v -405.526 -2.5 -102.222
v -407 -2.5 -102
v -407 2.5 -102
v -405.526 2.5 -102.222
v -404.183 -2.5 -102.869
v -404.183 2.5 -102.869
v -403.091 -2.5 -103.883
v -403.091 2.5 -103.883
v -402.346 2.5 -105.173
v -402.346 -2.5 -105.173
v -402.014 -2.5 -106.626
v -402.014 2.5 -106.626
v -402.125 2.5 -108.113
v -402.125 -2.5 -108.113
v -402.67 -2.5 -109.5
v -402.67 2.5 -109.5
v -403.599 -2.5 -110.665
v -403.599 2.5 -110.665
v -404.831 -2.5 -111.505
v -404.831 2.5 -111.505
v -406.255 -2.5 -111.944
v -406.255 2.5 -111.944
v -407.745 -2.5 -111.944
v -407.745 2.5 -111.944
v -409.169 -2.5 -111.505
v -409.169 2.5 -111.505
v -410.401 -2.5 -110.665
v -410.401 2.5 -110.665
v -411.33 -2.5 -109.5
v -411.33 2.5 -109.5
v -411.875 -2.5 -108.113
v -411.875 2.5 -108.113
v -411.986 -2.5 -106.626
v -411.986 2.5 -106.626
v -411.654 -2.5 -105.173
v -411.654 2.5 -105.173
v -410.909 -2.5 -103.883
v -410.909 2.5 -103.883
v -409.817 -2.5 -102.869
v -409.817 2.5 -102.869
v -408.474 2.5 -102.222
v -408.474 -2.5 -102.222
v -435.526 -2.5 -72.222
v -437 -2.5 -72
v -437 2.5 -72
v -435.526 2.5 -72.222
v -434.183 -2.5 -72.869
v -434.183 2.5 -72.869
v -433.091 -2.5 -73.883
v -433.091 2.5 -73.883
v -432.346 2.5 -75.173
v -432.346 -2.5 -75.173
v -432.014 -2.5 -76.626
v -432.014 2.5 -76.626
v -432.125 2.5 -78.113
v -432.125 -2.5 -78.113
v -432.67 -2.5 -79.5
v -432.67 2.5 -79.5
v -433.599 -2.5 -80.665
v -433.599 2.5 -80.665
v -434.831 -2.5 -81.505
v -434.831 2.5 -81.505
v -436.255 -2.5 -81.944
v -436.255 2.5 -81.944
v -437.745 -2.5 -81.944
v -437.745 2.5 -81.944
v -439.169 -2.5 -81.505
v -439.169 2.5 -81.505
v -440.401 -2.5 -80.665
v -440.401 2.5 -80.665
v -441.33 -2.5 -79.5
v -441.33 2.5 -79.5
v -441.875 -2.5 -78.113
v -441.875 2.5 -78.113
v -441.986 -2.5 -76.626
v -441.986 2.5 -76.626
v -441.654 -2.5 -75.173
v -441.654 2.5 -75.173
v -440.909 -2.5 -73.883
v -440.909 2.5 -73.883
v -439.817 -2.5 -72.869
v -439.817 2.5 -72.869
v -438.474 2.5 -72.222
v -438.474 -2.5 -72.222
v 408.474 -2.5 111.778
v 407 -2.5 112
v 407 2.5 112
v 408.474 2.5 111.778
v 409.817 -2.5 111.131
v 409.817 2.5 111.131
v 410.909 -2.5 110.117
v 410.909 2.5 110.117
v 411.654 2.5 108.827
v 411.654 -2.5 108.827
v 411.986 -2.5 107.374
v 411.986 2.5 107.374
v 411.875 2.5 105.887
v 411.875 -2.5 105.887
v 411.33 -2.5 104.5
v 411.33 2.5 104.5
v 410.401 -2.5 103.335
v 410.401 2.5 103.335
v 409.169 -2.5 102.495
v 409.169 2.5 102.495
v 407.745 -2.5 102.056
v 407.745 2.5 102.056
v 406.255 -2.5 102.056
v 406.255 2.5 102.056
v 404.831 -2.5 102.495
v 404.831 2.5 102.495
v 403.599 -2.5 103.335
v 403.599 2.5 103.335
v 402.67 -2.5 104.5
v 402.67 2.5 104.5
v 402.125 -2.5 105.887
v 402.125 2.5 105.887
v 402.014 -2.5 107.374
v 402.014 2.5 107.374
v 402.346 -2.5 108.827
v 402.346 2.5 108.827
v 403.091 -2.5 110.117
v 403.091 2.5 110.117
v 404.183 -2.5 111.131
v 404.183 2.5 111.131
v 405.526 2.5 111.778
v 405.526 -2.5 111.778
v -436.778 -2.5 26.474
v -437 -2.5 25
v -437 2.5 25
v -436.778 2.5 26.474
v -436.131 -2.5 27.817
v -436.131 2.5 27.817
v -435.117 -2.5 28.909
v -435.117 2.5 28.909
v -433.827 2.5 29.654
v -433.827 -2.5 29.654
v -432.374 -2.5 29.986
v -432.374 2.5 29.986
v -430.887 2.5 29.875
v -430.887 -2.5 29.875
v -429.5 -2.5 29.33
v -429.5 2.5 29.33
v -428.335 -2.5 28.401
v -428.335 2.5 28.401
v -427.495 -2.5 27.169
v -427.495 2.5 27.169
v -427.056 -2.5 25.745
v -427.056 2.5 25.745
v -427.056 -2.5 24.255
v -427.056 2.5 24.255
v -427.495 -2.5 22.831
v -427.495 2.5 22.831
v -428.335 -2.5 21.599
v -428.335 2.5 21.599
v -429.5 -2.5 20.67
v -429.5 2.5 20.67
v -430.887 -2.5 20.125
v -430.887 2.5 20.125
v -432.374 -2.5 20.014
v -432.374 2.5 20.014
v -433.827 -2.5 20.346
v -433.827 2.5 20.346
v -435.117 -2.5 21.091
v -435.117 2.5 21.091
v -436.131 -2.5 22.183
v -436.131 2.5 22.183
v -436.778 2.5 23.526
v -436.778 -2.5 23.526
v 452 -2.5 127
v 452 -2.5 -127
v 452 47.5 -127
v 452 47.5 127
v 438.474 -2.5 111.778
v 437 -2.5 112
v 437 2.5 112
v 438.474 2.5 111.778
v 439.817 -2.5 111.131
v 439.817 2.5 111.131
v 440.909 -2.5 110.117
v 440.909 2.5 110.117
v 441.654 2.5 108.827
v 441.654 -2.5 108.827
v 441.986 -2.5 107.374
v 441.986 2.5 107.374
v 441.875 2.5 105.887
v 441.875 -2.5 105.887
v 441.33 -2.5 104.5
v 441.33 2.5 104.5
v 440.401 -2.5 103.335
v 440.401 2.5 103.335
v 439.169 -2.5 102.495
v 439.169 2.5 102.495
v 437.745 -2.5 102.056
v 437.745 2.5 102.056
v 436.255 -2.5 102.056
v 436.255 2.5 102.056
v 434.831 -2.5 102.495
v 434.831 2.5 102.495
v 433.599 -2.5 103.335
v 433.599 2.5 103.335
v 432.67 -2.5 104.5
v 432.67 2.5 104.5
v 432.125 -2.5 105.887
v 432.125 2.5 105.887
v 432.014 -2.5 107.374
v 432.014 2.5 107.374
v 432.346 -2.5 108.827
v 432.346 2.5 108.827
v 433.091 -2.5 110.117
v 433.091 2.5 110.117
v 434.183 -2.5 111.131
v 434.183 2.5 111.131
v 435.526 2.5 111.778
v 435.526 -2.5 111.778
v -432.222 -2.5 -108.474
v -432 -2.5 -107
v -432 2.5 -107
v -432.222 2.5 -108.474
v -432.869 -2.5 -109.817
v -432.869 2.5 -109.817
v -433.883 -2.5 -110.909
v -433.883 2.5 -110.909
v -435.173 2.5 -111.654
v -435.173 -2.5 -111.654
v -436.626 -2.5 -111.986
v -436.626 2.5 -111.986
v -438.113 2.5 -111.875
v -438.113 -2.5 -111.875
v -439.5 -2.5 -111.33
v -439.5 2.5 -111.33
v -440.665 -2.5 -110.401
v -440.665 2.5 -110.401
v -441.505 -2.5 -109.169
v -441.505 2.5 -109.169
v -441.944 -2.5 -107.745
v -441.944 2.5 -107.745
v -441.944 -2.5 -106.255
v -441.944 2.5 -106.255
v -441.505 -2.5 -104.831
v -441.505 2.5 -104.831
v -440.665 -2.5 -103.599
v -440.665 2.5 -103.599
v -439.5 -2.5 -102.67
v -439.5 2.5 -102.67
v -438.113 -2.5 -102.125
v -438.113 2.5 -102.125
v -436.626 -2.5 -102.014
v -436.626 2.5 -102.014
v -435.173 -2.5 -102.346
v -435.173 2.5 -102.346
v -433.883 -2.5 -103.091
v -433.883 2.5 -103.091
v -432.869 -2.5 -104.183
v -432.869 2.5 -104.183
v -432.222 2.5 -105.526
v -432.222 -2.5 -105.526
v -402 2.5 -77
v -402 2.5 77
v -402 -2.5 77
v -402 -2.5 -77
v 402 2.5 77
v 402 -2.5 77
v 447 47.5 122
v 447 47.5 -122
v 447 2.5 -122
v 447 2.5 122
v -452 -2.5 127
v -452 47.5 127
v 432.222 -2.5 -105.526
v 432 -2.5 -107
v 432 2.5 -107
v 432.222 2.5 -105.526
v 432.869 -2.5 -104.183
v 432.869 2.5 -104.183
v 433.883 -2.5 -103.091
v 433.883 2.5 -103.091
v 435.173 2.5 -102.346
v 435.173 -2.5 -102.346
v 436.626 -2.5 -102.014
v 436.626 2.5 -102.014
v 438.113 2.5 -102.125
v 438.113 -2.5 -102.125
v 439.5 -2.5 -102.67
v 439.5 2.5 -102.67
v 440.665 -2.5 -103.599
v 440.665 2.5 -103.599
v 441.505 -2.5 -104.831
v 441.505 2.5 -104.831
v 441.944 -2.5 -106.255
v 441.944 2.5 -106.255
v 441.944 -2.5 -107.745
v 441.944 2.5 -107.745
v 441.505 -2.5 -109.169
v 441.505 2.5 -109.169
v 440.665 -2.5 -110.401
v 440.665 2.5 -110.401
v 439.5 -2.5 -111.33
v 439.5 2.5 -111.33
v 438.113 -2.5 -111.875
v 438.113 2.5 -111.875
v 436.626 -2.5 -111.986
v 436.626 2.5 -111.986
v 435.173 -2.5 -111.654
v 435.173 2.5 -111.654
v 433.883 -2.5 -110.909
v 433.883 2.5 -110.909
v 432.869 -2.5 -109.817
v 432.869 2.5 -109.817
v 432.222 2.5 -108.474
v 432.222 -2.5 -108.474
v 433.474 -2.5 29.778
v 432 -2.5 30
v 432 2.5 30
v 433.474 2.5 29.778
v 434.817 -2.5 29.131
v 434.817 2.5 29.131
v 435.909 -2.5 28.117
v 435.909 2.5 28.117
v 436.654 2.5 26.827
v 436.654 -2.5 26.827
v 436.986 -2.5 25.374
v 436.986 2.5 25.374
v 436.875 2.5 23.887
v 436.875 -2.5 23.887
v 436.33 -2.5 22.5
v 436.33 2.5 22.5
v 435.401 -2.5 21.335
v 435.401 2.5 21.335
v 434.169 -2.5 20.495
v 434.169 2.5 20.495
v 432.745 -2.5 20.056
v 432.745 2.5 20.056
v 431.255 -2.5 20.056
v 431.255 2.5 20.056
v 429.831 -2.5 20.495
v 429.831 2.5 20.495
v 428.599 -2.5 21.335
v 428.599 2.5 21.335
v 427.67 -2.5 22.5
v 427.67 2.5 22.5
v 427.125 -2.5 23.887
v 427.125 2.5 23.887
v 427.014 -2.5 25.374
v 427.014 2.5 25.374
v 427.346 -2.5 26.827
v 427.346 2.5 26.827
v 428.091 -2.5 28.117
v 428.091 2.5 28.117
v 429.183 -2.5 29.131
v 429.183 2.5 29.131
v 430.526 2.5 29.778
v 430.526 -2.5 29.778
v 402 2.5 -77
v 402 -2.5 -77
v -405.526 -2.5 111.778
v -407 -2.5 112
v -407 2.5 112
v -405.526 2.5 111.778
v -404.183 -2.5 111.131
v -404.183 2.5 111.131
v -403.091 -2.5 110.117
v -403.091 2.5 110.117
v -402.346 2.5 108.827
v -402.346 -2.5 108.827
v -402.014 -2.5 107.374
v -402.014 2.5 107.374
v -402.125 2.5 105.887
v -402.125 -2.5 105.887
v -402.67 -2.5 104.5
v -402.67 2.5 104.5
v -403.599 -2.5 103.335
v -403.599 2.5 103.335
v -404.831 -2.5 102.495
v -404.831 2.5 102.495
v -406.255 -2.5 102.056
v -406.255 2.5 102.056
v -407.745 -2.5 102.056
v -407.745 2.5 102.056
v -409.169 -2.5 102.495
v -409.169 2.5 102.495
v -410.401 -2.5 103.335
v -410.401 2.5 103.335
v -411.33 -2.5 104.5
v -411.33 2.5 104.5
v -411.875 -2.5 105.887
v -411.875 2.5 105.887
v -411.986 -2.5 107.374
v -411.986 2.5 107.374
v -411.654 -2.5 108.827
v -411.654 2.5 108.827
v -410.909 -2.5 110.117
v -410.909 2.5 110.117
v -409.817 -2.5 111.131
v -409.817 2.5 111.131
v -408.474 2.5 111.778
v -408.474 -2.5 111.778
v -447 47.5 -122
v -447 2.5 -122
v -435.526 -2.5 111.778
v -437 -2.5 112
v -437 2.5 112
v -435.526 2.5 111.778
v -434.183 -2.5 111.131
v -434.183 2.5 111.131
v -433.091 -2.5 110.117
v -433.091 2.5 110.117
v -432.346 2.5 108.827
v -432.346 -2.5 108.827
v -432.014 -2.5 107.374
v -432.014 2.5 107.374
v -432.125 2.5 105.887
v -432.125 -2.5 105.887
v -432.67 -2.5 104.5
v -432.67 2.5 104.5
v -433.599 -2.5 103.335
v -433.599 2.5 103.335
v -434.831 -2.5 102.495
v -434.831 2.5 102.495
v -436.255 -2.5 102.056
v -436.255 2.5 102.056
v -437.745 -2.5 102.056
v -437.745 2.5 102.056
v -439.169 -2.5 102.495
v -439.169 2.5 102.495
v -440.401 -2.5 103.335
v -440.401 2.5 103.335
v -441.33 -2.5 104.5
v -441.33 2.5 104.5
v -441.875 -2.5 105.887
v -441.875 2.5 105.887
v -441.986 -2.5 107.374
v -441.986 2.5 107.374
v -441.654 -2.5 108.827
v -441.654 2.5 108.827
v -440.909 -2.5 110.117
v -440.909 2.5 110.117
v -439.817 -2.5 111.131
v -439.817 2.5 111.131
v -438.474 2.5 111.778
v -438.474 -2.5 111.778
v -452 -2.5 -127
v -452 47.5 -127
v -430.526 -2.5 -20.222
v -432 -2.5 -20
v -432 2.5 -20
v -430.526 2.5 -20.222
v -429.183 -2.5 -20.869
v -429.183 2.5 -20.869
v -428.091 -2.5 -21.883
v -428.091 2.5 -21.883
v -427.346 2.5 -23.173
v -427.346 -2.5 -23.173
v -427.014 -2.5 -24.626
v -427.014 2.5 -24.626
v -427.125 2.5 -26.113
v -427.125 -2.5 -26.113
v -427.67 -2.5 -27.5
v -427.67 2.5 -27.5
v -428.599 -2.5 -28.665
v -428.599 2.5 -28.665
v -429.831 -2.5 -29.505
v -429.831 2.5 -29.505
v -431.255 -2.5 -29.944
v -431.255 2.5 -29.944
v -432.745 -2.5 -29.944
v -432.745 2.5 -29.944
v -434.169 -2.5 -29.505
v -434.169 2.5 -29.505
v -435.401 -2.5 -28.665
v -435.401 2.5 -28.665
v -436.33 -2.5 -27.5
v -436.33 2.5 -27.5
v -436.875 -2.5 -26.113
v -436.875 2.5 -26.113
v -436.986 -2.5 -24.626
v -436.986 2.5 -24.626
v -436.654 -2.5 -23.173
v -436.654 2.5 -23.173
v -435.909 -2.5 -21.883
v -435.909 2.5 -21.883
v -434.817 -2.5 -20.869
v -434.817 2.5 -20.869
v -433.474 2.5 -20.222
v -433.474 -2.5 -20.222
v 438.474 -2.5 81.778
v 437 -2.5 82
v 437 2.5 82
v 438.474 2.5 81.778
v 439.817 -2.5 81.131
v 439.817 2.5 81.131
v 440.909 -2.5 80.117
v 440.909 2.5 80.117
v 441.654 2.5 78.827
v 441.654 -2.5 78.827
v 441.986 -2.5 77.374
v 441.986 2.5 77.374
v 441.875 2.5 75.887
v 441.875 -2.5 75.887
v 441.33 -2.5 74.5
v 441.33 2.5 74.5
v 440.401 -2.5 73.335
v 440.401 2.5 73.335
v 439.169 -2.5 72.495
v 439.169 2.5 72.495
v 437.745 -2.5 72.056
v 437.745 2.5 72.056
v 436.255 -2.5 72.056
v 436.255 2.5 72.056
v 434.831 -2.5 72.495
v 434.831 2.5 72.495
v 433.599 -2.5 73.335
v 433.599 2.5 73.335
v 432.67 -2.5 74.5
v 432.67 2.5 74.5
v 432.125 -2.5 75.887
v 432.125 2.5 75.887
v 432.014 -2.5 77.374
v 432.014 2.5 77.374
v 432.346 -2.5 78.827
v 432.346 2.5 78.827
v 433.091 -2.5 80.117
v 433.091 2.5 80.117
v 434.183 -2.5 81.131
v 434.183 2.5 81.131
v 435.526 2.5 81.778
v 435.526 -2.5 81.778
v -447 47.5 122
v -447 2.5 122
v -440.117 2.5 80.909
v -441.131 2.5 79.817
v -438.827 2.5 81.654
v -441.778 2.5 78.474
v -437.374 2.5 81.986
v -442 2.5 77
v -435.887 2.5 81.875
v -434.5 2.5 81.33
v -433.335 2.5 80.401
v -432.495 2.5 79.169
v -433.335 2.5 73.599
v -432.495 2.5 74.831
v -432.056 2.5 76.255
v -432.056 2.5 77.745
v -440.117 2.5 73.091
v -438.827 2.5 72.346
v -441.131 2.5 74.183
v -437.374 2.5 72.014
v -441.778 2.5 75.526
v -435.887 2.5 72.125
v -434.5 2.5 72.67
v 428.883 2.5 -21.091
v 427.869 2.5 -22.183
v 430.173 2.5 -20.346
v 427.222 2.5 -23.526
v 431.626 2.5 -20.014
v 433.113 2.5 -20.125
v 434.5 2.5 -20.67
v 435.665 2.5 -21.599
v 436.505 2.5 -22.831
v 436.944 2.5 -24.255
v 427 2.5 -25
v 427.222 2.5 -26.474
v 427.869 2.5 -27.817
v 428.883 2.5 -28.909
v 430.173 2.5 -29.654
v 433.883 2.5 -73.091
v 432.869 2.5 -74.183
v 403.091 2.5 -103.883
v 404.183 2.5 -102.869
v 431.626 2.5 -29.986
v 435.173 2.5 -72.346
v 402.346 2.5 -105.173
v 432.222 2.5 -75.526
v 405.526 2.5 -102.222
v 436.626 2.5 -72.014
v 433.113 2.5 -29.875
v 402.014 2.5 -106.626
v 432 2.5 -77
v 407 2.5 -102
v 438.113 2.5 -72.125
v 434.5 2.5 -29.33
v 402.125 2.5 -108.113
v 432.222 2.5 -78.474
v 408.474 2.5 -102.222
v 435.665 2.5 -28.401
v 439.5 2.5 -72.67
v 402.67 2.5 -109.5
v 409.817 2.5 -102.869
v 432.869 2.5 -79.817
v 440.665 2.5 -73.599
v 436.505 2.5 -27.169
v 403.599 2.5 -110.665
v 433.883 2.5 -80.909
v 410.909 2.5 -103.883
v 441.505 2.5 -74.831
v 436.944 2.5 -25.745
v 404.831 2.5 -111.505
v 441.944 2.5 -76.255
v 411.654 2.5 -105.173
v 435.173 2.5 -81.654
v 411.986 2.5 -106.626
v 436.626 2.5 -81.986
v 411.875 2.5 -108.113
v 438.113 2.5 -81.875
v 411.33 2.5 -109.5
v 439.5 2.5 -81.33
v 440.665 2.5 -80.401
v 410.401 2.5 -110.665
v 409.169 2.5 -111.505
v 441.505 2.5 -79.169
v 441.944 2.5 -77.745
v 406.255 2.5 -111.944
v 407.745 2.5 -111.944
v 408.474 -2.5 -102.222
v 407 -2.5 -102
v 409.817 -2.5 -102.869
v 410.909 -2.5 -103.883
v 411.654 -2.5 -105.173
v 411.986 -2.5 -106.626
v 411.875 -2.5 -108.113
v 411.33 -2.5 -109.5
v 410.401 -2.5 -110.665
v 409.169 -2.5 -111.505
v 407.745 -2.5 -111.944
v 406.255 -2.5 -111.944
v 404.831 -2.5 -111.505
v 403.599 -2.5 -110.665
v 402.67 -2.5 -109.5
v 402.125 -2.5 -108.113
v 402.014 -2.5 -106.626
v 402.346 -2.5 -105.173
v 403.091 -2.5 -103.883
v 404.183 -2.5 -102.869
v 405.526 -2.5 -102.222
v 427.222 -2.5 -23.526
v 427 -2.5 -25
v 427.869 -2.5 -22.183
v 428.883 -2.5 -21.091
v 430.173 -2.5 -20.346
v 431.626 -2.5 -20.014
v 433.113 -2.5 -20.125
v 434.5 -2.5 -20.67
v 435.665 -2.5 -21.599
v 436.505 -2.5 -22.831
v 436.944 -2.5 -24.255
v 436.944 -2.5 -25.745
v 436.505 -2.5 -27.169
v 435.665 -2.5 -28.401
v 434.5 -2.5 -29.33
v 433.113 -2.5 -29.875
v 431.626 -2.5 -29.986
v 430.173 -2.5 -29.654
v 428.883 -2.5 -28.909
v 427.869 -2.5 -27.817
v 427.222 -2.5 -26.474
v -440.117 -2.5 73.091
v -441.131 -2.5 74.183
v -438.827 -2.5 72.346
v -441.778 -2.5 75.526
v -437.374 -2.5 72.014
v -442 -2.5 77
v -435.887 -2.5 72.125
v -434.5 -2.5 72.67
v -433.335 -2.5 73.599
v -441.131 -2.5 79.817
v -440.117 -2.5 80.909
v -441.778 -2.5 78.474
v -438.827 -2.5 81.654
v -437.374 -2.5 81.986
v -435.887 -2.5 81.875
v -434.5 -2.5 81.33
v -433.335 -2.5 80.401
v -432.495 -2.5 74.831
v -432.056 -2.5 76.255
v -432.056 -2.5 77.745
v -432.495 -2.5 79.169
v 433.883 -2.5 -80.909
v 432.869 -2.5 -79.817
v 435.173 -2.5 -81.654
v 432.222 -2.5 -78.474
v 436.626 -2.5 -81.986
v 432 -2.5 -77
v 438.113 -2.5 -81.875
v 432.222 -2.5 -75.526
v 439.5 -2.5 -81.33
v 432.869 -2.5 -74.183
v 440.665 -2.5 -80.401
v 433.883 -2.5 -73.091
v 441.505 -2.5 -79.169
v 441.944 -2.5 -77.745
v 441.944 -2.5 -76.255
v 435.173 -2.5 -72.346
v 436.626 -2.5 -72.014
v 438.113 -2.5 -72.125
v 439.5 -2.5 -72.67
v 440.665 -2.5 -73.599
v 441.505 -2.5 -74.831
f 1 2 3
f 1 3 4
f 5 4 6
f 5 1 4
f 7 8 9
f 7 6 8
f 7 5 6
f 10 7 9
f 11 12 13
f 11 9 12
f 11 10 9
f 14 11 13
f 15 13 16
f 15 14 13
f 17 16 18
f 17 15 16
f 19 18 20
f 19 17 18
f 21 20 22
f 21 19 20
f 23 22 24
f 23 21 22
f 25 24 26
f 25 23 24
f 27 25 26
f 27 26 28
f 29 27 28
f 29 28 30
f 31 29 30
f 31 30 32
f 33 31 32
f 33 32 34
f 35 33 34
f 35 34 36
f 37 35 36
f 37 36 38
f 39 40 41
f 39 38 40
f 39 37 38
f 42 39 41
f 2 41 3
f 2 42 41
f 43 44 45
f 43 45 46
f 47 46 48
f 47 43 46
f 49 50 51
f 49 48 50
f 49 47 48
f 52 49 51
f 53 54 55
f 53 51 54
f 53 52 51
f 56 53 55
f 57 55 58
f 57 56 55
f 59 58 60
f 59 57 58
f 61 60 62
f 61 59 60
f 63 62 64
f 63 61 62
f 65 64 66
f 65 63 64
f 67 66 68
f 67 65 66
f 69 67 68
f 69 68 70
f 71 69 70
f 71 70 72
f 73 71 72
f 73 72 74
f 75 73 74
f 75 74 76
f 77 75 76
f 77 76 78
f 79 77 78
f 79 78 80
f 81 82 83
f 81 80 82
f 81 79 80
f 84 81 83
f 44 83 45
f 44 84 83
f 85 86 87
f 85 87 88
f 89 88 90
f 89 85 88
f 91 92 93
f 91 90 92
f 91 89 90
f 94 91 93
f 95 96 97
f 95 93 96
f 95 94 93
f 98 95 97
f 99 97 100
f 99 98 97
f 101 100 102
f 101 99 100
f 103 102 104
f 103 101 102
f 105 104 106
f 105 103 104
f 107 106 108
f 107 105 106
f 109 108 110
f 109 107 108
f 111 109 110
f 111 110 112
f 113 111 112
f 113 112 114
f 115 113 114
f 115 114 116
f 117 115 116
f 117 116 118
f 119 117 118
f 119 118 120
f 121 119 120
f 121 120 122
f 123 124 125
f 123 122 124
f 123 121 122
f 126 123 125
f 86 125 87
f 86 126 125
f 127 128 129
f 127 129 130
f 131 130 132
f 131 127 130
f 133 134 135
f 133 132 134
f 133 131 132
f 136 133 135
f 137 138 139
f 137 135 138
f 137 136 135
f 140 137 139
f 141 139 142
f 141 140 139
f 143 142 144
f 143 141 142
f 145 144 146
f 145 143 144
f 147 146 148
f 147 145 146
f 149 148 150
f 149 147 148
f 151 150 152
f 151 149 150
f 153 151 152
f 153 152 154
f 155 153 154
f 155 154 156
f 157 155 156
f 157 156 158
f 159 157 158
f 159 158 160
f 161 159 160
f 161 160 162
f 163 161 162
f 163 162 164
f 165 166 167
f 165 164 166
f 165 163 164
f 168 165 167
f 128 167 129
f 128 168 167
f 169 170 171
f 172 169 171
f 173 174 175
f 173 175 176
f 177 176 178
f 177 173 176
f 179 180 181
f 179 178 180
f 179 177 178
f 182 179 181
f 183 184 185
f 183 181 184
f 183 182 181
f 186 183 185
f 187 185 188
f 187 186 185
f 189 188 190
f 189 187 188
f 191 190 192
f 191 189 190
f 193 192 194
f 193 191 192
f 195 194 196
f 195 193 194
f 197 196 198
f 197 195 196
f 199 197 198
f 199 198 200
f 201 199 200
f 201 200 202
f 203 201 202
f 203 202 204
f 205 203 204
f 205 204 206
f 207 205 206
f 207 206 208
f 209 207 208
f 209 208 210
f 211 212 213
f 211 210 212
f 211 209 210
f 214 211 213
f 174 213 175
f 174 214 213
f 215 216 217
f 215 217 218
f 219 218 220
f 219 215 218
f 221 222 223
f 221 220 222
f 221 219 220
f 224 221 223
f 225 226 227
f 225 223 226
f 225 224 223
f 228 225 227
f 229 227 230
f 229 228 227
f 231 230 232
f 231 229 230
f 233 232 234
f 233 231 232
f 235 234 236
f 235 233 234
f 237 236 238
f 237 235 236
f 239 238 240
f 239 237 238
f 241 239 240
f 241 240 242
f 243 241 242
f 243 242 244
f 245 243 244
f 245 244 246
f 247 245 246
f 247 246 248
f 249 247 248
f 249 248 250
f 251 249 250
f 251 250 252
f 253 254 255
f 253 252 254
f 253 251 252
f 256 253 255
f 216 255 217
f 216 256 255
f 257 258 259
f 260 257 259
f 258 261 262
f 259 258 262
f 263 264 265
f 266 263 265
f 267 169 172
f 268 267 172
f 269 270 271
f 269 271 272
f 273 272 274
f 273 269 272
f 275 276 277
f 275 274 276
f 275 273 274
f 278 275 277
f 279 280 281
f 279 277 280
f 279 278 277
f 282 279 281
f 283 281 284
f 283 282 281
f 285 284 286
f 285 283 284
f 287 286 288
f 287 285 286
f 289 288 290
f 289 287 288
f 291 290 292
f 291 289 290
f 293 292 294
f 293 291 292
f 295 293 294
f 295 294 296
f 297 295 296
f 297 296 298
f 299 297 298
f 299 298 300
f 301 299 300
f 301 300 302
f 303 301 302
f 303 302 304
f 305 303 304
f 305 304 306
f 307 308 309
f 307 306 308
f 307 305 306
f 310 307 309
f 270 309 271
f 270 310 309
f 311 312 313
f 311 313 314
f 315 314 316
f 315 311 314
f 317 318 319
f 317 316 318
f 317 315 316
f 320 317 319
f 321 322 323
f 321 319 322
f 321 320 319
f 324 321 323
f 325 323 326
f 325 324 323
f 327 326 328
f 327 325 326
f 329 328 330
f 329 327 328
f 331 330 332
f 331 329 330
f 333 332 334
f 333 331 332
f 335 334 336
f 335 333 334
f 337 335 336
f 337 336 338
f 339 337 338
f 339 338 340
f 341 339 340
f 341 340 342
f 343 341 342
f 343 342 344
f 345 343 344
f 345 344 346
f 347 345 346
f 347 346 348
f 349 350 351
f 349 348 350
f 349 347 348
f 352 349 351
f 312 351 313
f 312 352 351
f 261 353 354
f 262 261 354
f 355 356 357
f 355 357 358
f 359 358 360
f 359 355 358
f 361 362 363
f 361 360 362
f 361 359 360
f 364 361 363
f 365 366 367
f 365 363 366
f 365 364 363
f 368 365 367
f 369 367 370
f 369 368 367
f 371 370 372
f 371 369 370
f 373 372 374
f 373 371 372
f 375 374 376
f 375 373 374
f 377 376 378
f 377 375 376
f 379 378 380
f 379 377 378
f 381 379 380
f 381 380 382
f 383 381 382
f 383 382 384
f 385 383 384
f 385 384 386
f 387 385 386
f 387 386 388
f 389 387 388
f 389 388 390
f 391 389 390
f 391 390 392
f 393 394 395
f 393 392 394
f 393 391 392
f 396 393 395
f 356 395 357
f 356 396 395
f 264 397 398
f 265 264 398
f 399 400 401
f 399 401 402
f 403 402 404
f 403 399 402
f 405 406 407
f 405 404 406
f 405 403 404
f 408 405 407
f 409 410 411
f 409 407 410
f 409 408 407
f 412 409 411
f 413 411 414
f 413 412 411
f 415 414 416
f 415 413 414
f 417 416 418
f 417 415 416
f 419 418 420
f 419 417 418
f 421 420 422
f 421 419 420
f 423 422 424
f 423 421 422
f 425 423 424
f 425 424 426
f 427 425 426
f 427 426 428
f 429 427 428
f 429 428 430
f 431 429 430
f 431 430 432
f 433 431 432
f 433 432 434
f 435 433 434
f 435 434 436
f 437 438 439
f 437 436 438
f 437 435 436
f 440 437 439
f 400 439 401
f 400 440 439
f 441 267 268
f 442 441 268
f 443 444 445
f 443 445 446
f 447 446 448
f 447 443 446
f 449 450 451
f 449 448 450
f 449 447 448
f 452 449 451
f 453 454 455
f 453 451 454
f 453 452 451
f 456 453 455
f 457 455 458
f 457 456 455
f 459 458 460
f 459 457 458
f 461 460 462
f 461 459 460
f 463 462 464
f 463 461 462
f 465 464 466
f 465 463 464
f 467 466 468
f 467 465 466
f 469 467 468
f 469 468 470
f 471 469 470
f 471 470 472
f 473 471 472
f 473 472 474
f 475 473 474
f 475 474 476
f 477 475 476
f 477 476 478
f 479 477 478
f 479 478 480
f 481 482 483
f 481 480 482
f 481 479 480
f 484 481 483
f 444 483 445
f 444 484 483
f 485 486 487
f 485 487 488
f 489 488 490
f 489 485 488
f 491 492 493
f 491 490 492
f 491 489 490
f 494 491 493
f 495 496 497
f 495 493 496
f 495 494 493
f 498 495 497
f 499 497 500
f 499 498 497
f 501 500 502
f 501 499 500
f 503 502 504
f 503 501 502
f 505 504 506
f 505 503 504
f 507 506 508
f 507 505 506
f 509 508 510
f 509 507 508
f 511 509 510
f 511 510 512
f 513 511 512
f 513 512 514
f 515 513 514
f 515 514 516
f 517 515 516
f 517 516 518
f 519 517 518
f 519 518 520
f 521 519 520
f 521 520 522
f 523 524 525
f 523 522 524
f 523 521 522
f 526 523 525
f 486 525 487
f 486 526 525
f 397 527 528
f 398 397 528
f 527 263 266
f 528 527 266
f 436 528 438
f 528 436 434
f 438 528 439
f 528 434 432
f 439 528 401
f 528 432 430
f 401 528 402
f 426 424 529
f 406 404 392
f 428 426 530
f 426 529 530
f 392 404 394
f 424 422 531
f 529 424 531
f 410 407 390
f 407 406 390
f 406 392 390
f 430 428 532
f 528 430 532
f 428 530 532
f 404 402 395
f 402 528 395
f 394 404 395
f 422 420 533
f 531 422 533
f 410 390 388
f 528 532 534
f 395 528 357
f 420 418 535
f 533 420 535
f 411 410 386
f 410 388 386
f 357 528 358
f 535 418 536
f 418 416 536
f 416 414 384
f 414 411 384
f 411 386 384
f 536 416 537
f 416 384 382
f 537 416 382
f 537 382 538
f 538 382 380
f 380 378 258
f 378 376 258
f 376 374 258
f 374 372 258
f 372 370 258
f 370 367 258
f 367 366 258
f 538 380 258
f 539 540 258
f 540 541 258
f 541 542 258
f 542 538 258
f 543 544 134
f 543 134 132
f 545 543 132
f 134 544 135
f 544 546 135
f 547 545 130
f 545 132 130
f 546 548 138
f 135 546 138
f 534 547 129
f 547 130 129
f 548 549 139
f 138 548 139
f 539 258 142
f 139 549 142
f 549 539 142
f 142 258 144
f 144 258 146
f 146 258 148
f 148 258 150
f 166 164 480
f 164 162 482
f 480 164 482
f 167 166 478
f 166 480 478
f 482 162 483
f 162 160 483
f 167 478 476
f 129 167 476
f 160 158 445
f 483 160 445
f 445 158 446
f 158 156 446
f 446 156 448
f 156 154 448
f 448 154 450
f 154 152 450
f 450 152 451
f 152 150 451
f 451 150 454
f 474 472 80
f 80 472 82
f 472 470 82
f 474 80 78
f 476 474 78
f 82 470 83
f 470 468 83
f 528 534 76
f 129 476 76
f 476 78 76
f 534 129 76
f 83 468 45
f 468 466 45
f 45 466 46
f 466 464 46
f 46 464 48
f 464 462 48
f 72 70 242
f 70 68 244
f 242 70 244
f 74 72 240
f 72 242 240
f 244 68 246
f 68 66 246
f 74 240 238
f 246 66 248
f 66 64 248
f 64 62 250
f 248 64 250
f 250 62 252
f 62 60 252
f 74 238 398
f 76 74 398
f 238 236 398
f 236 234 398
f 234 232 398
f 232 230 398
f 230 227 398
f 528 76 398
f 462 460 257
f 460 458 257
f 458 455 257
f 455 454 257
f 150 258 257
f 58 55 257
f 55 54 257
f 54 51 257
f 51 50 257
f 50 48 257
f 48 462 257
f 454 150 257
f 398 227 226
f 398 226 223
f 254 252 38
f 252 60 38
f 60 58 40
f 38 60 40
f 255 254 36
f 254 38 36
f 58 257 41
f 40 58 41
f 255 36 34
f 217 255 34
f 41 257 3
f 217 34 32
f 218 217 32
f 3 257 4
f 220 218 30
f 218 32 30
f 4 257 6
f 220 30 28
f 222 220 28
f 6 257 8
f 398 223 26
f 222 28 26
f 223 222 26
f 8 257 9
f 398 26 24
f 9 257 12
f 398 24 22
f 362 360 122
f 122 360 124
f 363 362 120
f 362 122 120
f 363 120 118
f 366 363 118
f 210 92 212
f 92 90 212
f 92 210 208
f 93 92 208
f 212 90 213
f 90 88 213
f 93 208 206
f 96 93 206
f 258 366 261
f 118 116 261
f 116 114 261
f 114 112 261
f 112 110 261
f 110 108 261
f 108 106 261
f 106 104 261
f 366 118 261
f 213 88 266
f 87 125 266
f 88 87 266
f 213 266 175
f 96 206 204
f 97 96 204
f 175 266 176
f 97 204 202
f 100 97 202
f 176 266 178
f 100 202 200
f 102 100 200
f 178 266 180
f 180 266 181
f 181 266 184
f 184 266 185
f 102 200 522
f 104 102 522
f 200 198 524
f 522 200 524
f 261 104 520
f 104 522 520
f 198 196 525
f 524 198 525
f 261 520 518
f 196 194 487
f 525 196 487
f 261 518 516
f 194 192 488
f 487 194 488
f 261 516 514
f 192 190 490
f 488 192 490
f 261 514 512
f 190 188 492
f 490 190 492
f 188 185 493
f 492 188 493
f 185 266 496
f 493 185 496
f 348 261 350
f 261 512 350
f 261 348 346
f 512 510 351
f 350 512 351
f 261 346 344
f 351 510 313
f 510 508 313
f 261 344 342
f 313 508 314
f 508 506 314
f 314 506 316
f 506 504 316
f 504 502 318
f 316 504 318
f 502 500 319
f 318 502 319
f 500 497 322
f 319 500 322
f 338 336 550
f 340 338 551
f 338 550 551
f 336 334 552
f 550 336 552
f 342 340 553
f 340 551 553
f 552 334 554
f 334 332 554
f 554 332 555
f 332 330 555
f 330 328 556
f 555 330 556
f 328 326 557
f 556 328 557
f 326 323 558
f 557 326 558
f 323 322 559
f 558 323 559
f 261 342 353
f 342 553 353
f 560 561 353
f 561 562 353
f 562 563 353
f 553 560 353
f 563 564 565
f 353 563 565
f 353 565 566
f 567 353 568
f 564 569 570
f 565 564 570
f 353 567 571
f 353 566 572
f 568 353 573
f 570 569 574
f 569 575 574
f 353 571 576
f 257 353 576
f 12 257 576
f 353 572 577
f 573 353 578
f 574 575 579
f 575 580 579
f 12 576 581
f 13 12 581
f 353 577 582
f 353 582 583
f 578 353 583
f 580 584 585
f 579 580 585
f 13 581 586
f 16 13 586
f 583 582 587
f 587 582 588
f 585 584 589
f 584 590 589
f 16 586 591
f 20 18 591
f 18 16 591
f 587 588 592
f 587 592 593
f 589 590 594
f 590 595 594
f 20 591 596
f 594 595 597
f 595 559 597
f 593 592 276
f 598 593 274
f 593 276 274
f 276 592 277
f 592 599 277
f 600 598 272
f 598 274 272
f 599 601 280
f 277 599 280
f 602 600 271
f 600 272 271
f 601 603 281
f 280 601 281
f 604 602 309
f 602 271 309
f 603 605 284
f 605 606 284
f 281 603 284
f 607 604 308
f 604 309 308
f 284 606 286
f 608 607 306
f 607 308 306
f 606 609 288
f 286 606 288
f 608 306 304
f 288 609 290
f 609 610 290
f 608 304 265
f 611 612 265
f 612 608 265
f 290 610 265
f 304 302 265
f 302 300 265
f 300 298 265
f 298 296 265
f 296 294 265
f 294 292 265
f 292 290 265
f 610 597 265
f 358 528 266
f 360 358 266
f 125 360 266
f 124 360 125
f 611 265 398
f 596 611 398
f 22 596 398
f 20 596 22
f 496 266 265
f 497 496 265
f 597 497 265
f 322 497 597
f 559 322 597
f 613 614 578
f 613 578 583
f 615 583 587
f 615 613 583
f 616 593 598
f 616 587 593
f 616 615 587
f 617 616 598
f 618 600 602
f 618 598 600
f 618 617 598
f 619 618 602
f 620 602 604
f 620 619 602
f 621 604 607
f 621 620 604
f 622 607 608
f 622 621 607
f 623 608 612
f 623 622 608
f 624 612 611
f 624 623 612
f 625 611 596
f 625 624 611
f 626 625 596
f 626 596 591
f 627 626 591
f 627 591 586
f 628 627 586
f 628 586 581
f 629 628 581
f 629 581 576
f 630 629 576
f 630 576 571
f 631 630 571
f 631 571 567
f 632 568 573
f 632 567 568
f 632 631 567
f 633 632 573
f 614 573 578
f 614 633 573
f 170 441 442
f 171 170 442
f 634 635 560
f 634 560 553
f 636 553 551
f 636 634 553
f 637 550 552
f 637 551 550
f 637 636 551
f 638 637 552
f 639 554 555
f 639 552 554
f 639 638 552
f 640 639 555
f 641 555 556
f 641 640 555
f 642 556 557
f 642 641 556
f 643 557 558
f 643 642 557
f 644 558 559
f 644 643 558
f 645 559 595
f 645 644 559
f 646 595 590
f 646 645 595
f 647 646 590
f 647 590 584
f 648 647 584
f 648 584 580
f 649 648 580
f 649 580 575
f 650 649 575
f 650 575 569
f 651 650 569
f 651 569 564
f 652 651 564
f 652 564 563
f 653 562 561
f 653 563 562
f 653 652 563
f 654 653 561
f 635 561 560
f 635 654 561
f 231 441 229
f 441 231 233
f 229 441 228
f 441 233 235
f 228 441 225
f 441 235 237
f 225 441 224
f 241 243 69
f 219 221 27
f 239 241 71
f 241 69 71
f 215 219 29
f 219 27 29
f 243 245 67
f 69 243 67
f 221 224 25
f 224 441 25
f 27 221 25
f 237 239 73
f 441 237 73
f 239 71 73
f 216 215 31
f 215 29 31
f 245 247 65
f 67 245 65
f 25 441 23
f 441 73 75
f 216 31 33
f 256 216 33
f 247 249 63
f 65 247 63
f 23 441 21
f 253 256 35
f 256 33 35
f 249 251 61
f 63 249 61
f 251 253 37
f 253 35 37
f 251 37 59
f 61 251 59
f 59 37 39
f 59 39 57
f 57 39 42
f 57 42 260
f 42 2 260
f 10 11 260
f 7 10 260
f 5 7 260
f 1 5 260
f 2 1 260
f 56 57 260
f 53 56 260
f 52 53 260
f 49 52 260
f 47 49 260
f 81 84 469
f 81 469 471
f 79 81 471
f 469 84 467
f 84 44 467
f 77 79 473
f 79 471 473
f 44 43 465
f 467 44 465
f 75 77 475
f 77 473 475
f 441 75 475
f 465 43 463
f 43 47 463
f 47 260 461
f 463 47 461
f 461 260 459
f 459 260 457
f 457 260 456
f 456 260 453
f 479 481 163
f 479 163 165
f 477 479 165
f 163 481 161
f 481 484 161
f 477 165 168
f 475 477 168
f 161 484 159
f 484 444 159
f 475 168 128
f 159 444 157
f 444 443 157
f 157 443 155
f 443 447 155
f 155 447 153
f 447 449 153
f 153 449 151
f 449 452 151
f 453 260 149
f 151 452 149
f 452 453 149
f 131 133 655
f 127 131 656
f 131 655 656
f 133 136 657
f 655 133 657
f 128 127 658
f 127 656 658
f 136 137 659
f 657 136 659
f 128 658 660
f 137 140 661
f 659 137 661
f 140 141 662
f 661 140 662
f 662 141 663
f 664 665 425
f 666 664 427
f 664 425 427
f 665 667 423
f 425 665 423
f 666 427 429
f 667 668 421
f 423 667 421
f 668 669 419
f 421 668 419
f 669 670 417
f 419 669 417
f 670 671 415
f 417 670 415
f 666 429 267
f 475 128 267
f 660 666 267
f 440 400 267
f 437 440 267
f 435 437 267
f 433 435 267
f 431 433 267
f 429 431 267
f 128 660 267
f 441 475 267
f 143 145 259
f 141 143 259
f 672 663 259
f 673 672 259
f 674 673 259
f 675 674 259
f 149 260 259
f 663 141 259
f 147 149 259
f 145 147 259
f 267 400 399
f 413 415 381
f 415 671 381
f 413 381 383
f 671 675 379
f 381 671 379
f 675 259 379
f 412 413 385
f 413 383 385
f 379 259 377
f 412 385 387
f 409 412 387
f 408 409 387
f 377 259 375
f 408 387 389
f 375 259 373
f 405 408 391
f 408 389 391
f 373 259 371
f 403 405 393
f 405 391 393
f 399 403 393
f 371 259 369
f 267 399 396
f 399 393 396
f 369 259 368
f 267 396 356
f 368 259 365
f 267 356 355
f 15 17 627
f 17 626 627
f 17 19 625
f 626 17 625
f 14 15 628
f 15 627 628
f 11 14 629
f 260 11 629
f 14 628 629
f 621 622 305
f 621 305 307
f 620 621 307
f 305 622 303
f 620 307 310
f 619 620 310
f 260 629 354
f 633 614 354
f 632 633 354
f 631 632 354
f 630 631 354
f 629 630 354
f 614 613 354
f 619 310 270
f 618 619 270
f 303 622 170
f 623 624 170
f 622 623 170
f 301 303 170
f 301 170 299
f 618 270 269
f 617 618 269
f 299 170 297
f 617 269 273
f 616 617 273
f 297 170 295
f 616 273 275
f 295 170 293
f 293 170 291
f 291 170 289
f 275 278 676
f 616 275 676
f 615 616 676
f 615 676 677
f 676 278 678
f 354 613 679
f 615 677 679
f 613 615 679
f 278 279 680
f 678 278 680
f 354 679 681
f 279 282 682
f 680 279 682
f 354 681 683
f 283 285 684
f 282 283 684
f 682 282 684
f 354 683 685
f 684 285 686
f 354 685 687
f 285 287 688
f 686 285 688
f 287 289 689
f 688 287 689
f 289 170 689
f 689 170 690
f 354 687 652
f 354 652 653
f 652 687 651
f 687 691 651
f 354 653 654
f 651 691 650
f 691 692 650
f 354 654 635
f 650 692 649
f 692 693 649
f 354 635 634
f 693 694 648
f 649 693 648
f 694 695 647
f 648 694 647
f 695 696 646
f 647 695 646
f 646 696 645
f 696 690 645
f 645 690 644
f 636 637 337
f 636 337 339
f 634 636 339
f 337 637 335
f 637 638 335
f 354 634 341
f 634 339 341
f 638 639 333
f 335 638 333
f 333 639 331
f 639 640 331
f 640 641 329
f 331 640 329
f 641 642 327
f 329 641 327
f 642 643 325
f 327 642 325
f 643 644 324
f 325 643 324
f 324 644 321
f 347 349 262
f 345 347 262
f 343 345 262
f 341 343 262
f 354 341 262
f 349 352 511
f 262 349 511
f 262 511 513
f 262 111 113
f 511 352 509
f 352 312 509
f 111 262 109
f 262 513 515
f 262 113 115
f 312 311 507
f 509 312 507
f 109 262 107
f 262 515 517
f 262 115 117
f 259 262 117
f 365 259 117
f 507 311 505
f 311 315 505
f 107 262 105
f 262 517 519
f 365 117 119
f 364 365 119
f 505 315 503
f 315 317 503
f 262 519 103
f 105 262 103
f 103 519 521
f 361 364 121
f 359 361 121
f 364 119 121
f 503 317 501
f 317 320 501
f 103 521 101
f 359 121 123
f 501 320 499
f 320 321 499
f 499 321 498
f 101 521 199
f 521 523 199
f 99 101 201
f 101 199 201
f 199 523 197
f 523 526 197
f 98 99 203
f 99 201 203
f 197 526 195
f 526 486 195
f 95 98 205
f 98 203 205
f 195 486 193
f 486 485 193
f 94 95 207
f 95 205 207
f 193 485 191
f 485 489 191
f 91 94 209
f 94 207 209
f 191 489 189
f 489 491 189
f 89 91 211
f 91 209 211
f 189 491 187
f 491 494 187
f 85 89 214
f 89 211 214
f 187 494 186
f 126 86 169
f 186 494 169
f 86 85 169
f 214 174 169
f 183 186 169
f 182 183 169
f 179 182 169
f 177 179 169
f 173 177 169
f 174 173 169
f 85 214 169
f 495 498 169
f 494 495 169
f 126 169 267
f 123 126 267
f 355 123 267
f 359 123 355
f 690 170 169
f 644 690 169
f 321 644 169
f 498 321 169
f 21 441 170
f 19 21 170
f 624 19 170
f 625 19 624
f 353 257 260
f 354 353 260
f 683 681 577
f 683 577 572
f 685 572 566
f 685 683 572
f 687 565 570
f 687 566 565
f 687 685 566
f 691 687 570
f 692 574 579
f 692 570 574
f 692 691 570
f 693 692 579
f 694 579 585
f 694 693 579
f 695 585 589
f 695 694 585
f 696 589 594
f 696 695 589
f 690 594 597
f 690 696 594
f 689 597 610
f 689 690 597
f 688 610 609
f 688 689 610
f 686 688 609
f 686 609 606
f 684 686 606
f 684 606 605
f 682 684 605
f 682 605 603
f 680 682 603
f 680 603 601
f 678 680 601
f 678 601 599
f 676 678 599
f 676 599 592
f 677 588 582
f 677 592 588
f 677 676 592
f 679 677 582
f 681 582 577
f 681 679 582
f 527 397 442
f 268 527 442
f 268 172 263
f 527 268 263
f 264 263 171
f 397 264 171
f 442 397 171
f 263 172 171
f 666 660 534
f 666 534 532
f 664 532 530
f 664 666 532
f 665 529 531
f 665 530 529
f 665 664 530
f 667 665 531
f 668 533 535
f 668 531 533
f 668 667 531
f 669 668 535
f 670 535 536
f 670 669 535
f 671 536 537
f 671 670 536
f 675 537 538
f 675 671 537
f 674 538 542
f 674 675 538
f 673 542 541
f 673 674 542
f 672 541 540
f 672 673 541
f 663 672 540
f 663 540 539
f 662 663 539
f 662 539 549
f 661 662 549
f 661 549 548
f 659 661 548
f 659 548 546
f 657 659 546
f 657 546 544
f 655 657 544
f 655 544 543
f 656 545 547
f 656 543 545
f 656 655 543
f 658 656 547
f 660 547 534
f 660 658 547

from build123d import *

# Parameters (mm, degrees)
CUT_EXTRUDE1_DEPTH      = 472.899618563
CUT_EXTRUDE1_DEPTH_BACK = 472.899618563
SKETCH5_R               = 5


with BuildPart() as part:
    # Sweep3: sweep along a path in Sketch1
    with BuildLine(Plane(origin=(0, 0, 0), x_dir=(1, 0, 0), z_dir=(0, 1, 0))) as sweep3_path:
        Line((-450, -125), (450, -125))
        Line((450, -125), (450, 125))
        Line((450, 125), (-450, 125))
        Line((-450, 125), (-450, -125))
    # Sketch2 → Sweep3 (sweep)
    with BuildSketch(Plane.XY):
        Polygon((402, -2.5), (452, -2.5), (452, 47.5), (447, 47.5), (447, 2.5), (402, 2.5), align=None)
    sweep(path=sweep3_path.line, transition=Transition.RIGHT)

    # Sketch5 → Cut-Extrude1 (cut, two sides: drawn at the far end of the back side and taken through both)
    with BuildSketch(Plane(origin=(0, 0, 0), x_dir=(1, 0, 0), z_dir=(0, 1, 0)).offset(-CUT_EXTRUDE1_DEPTH_BACK)):
        with Locations((-437, 107)):
            Circle(SKETCH5_R)
        with Locations(Location((-407, 107, 0), (0, 0, 270))):
            Circle(SKETCH5_R)
        with Locations(Location((-432, 25, 0), (0, 0, 270))):
            Circle(SKETCH5_R)
        with Locations(Location((-437, 77, 0), (0, 0, 270))):
            Circle(SKETCH5_R)
        with Locations(Location((-407, -107, 0), (0, 0, 270))):
            Circle(SKETCH5_R)
        with Locations(Location((-437, -107, 0), (0, 0, 270))):
            Circle(SKETCH5_R)
        with Locations(Location((-437, -77, 0), (0, 0, 180))):
            Circle(SKETCH5_R)
        with Locations(Location((-432, -25, 0), (0, 0, 180))):
            Circle(SKETCH5_R)
        with Locations(Location((432, -25, 0), (0, 0, 270))):
            Circle(SKETCH5_R)
        with Locations(Location((437, -77, 0), (0, 0, 270))):
            Circle(SKETCH5_R)
        with Locations(Location((437, -107, 0), (0, 0, 270))):
            Circle(SKETCH5_R)
        with Locations(Location((407, -107, 0), (0, 0, 270))):
            Circle(SKETCH5_R)
        with Locations(Location((437, 77, 0), (0, 0, 180))):
            Circle(SKETCH5_R)
        with Locations(Location((432, 25, 0), (0, 0, 180))):
            Circle(SKETCH5_R)
        with Locations(Location((407, 107, 0), (0, 0, 270))):
            Circle(SKETCH5_R)
        with Locations(Location((437, 107, 0), (0, 0, 180))):
            Circle(SKETCH5_R)
    extrude(amount=CUT_EXTRUDE1_DEPTH + CUT_EXTRUDE1_DEPTH_BACK, mode=Mode.SUBTRACT)


solid = part.part
